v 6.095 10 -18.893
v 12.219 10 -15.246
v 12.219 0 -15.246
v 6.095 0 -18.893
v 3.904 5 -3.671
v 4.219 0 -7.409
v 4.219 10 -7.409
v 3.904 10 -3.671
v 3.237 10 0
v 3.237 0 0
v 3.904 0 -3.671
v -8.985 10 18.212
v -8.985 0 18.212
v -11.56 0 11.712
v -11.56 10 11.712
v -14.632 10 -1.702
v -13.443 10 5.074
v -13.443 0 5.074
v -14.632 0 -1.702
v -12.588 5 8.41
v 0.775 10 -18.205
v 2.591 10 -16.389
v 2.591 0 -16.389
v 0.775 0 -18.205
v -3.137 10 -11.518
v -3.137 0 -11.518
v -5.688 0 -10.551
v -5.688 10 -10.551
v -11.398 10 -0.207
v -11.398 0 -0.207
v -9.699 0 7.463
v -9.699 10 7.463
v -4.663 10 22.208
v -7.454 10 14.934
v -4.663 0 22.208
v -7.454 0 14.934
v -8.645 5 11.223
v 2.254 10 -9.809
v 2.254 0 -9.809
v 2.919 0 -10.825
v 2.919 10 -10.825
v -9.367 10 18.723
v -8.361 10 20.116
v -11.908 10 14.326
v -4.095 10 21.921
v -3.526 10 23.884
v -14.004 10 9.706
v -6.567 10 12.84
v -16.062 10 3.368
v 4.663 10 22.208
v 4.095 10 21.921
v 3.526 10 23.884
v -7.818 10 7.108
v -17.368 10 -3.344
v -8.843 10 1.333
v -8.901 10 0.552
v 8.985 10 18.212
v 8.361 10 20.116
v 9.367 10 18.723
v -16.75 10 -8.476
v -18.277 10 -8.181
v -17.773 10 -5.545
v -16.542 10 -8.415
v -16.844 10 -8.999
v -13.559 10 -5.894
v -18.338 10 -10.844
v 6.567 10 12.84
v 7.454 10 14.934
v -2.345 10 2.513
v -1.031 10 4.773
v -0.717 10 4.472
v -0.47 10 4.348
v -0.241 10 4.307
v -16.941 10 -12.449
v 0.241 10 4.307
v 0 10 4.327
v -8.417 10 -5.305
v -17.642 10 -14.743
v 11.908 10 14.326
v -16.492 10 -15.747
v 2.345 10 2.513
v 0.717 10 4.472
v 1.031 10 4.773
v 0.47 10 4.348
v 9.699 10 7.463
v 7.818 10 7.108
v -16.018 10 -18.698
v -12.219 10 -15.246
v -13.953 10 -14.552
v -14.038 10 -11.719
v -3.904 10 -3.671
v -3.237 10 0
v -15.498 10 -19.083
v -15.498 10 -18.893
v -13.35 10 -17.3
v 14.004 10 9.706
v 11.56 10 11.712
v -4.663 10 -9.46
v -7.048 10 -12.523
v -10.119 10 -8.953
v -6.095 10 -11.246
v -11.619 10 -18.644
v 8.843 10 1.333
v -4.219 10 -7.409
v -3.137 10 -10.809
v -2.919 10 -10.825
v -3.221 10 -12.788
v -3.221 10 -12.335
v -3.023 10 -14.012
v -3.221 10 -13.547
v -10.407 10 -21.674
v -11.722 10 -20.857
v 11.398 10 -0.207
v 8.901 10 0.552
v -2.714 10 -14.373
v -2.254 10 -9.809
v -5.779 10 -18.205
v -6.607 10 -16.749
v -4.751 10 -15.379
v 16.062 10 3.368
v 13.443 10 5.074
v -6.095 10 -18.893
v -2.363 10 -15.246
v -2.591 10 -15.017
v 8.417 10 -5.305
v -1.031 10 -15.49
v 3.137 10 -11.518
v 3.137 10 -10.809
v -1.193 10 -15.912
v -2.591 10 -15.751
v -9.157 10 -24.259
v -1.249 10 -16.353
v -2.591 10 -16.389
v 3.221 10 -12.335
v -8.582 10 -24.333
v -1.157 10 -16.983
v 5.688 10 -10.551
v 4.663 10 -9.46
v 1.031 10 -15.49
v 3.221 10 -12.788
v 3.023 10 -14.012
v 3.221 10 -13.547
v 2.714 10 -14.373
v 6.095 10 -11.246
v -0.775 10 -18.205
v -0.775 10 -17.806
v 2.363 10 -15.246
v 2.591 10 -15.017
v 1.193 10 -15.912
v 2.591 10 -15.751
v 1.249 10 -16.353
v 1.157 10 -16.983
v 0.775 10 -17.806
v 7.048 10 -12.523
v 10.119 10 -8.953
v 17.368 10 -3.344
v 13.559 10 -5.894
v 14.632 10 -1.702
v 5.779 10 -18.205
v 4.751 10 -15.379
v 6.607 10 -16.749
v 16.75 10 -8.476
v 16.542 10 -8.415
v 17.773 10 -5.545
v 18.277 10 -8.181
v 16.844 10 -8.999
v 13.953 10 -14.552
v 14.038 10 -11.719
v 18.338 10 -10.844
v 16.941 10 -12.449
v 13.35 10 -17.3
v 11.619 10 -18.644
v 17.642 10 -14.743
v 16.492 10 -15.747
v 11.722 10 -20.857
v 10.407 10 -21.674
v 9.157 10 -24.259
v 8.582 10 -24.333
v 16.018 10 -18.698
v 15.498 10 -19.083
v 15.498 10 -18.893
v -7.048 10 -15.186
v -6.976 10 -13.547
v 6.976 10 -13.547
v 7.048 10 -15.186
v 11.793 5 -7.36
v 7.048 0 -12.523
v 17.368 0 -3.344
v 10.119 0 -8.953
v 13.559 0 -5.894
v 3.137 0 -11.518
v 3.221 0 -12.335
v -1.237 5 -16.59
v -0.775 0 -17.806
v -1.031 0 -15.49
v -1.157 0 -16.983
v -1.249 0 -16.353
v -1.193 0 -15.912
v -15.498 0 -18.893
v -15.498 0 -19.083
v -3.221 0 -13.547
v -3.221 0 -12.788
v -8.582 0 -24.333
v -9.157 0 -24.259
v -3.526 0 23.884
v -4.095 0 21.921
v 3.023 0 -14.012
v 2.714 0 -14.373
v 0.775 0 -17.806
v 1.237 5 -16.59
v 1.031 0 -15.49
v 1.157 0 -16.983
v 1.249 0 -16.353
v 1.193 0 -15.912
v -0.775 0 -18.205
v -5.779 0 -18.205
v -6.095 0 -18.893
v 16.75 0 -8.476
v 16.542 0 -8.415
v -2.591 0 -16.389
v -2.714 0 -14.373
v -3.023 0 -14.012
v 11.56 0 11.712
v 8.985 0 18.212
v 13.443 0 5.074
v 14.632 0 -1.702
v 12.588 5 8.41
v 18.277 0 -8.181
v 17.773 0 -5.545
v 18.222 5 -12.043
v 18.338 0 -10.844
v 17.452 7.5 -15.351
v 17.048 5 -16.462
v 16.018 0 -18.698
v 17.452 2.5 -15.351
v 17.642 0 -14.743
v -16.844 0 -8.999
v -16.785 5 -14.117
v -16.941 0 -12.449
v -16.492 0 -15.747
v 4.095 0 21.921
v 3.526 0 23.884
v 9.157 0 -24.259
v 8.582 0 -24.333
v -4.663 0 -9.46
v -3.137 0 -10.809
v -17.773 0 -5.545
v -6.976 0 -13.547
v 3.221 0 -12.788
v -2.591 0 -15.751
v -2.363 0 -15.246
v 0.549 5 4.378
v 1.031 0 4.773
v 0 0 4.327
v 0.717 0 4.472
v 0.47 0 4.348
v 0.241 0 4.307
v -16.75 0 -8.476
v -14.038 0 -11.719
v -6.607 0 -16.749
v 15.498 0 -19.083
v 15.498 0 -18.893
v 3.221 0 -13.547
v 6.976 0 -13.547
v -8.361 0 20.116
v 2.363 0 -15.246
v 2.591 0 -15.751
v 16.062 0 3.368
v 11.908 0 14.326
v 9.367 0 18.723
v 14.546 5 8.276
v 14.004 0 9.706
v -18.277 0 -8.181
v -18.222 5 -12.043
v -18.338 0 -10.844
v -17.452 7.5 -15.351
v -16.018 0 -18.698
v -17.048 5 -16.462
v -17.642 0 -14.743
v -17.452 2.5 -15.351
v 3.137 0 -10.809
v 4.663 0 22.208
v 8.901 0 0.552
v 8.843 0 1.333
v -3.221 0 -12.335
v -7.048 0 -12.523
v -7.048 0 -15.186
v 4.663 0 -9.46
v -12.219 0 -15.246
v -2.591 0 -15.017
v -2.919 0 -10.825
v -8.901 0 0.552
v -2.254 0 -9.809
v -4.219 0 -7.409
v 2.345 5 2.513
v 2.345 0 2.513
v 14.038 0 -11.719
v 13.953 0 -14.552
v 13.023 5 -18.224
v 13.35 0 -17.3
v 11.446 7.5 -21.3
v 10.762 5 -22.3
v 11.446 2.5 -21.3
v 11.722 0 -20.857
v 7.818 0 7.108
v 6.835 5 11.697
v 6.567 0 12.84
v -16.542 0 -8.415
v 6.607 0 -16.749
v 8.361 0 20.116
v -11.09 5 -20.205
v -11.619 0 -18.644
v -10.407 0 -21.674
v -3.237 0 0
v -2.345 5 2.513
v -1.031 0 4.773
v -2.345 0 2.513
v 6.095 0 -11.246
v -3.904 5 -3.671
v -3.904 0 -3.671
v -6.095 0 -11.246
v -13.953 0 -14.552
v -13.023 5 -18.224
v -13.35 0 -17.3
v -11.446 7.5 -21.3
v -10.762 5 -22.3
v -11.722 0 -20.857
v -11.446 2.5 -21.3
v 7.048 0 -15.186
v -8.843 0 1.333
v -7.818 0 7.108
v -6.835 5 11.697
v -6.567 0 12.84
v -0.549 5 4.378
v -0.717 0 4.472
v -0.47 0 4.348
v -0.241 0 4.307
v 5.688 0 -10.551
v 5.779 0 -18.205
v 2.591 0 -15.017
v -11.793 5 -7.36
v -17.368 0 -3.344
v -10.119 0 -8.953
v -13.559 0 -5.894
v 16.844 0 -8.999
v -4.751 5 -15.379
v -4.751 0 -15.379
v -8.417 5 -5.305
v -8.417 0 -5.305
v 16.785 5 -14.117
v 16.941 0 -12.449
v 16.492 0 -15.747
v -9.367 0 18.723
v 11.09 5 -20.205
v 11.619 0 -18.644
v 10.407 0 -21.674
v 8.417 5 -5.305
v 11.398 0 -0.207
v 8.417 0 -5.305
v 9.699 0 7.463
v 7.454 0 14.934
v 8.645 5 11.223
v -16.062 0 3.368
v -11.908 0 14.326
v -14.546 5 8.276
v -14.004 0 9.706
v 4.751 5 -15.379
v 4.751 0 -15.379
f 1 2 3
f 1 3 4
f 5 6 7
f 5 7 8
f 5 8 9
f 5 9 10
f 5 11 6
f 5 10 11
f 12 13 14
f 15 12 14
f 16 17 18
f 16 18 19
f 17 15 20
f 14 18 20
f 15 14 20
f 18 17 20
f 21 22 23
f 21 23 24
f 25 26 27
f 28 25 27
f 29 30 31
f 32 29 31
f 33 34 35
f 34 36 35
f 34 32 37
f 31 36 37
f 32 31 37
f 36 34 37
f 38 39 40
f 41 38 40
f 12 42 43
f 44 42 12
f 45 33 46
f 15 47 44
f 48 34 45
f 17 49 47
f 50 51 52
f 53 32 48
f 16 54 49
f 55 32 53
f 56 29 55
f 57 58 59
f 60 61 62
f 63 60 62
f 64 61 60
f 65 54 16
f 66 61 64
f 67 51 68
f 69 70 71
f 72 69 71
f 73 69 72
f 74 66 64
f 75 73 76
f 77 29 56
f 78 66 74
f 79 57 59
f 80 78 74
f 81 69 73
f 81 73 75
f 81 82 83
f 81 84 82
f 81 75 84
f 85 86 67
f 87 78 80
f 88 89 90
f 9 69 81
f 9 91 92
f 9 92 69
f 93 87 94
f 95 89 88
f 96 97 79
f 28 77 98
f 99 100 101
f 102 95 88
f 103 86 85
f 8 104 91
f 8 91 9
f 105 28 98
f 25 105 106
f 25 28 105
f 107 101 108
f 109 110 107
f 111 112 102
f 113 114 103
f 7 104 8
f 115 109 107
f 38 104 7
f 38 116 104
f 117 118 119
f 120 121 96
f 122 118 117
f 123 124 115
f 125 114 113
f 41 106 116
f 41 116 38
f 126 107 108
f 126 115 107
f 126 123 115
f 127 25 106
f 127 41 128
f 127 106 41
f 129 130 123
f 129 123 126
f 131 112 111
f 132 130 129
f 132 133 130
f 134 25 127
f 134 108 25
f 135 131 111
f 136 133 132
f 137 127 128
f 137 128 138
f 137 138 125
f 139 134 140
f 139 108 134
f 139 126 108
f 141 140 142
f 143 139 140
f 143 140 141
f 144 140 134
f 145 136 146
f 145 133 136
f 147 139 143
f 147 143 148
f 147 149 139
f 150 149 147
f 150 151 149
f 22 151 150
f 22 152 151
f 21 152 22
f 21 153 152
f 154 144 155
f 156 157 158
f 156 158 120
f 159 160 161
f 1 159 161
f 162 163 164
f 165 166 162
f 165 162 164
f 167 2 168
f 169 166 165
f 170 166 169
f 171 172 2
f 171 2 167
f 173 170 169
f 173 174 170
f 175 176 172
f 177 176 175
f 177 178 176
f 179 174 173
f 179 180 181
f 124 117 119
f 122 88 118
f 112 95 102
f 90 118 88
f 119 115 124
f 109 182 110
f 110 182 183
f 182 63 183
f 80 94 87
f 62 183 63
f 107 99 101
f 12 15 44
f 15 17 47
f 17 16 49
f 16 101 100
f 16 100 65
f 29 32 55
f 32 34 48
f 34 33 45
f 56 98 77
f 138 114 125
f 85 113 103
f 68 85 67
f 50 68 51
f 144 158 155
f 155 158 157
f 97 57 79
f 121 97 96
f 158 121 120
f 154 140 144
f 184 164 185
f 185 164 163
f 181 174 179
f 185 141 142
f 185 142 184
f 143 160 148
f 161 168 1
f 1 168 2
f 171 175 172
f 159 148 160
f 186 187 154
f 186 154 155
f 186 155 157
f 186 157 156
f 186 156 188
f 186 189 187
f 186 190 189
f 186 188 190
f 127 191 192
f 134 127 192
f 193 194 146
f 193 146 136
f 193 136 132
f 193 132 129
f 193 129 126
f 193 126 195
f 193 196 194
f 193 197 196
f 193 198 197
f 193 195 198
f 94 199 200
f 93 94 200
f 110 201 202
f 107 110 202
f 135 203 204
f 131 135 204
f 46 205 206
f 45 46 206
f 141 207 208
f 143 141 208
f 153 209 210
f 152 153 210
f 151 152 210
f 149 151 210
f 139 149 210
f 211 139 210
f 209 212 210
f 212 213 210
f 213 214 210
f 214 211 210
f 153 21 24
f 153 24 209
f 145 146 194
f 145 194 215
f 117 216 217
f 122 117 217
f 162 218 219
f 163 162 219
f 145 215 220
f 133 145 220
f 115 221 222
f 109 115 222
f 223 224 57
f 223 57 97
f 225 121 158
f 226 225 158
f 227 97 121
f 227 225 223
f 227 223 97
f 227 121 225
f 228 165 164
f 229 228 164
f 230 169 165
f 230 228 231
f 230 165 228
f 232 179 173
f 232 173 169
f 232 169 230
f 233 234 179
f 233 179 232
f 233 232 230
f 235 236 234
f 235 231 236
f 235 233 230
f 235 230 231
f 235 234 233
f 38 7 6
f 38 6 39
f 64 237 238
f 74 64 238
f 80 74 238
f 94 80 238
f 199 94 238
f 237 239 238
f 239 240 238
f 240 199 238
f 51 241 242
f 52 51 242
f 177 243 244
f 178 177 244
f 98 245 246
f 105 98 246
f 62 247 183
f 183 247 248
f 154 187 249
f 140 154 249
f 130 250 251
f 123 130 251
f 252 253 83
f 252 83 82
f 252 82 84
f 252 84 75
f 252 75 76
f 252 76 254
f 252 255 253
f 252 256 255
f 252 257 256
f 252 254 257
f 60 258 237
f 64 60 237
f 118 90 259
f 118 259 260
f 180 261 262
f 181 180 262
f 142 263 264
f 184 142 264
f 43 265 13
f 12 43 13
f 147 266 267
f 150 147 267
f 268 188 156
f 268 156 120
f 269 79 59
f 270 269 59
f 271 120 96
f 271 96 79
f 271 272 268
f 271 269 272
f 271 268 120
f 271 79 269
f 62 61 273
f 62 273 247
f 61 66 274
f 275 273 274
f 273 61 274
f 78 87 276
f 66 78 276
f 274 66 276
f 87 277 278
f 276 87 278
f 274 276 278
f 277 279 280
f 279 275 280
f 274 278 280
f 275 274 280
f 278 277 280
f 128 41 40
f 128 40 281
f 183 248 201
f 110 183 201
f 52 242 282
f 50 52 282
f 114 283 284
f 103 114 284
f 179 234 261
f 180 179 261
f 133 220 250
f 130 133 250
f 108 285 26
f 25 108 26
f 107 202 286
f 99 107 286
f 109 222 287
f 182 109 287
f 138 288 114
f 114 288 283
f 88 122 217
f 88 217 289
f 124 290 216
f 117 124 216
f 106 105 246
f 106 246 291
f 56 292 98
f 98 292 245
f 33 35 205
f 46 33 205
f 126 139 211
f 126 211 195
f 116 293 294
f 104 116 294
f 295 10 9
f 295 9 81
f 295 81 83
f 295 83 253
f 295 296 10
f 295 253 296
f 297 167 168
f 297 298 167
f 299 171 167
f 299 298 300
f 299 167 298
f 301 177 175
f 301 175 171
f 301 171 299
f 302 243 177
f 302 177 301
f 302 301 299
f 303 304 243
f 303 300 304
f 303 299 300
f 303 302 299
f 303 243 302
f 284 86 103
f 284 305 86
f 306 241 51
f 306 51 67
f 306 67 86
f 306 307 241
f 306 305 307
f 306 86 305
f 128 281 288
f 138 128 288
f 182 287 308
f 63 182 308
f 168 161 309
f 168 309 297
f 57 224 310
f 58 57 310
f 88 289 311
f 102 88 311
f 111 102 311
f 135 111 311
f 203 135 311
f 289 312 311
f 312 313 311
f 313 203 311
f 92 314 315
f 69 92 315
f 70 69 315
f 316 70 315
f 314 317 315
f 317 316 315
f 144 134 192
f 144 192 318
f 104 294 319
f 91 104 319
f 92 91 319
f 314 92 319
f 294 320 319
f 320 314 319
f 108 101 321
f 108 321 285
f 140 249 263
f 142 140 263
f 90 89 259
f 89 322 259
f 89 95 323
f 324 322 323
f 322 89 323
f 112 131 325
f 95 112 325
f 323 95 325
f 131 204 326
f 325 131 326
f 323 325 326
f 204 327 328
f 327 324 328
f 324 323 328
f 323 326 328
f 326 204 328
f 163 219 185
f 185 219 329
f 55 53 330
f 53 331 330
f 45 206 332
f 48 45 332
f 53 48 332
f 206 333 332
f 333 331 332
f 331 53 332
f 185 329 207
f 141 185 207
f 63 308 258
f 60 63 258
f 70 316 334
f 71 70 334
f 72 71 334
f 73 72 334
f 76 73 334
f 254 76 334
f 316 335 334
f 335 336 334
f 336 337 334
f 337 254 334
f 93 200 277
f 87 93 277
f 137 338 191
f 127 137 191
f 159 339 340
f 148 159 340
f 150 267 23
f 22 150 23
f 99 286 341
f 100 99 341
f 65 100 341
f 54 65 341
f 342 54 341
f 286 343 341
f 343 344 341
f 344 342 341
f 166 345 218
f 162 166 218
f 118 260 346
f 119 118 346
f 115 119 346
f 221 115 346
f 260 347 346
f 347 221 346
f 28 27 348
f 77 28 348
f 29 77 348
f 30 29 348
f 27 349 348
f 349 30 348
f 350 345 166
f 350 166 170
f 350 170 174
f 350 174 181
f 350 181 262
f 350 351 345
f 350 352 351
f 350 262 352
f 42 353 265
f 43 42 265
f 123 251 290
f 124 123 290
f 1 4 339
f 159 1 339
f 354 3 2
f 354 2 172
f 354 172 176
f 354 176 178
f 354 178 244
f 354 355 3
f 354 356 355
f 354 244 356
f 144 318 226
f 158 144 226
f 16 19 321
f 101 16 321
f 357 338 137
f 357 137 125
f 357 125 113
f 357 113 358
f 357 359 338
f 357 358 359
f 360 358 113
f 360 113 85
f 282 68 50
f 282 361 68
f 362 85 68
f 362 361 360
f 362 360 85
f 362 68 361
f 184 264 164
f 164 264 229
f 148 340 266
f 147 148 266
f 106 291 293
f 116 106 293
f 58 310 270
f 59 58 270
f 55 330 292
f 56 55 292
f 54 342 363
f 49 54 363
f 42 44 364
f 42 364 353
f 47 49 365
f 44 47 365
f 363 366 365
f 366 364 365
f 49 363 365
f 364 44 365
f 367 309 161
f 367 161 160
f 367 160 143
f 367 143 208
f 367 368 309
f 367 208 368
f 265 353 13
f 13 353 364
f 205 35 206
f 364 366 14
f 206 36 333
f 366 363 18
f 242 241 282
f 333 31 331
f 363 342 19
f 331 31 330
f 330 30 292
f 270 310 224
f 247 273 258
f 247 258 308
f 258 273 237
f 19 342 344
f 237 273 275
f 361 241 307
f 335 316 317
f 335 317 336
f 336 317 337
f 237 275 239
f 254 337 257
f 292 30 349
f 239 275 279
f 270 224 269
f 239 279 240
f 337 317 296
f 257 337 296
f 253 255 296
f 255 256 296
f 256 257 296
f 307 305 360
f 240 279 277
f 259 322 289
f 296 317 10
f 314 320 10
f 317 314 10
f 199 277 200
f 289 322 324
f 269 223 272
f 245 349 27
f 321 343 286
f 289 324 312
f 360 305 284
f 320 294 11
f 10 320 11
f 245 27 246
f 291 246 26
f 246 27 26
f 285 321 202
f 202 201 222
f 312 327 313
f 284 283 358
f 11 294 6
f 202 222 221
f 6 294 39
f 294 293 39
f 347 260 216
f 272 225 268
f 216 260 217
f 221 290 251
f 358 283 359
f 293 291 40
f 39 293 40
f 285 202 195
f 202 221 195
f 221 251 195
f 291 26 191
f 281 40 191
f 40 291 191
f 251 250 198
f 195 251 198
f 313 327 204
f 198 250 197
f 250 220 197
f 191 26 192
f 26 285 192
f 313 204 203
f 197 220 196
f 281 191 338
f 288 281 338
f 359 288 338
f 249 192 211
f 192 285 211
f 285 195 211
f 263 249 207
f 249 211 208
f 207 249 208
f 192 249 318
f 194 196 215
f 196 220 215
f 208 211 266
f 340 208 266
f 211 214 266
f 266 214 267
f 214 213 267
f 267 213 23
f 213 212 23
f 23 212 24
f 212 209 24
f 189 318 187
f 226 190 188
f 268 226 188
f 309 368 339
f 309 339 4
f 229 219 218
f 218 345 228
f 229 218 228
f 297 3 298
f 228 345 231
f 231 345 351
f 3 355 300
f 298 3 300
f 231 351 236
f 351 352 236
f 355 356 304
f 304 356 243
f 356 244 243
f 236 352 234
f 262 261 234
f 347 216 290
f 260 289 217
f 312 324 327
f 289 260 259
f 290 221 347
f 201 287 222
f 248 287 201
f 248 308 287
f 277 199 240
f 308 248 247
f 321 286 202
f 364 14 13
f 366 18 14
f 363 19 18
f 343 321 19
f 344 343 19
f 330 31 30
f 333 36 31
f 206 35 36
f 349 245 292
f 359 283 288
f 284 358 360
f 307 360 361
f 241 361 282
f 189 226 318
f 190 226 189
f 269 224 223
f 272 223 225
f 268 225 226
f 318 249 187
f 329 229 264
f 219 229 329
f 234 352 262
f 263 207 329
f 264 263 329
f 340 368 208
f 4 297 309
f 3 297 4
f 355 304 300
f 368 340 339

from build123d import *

# Parameters (mm, degrees)
BOSS_EXTRUDE1_DEPTH = 10


with BuildPart() as part:
    # Sketch1 → Boss-Extrude1 (new body)
    with BuildSketch(Plane(origin=(0, 0, 0), x_dir=(1, 0, 0), z_dir=(0, 1, 0))):
        with BuildLine():
            Line((-0.77475919, 17.805575817), (-0.77475919, 18.205472922))
            Line((-0.77475919, 18.205472922), (-2.591328104, 16.388904008))
            Line((-2.591328104, 16.388904008), (-2.591328104, 15.751300349))
            Line((-2.591328104, 15.751300349), (-2.362753208, 15.246029526))
            Line((-2.362753208, 15.246029526), (-2.591328104, 15.017454629))
            Line((-2.591328104, 15.017454629), (-5.779346397, 18.205472922))
            Line((-5.779346397, 18.205472922), (-6.095268046, 18.892889731))
            Line((-6.095268046, 18.892889731), (-12.218826377, 15.246029526))
            add(Edge.make_bspline(
                [(-12.218826377, 15.246029526), (-11.778721685, 20.620695324), (-8.581947184, 24.333309757)],
                knots=[0, 0, 0, 1, 1, 1], degree=2))
            Line((-8.581947184, 24.333309757), (-9.157047212, 24.259356466))
            add(Edge.make_bspline(
                [(-9.157047212, 24.259356466), (-14.447655818, 18.459017457), (-14.037673367, 11.71891231)],
                knots=[0, 0, 0, 1, 1, 1], degree=2))
            Line((-14.037673367, 11.71891231), (-6.606809824, 16.748676517))
            add(Edge.make_bspline(
                [(-6.606809824, 16.748676517), (-4.84160761, 15.196820639), (-2.713996128, 14.373140945)],
                knots=[0, 0, 0, 1, 1, 1], degree=2))
            Line((-2.713996128, 14.373140945), (-3.022885214, 14.011805458))
            Line((-3.022885214, 14.011805458), (-7.04843704, 15.185986651))
            Line((-7.04843704, 15.185986651), (-16.542260828, 8.414995079))
            Line((-16.542260828, 8.414995079), (-16.750184267, 8.475642613))
            Line((-16.750184267, 8.475642613), (-16.844000716, 8.999446115))
            add(Edge.make_bspline(
                [(-16.844000716, 8.999446115), (-17.398318859, 14.288056659), (-15.498292646, 18.892889731)],
                knots=[0, 0, 0, 0.937492037, 0.937492037, 0.937492037], degree=2))
            Line((-15.498292646, 18.892889731), (-15.498292646, 19.083480243))
            Line((-15.498292646, 19.083480243), (-16.018185643, 18.698181665))
            add(Edge.make_bspline(
                [(-16.018185643, 18.698181665), (-19.54860855, 11.964227915), (-17.772645014, 5.545401207)],
                knots=[0, 0, 0, 1, 1, 1], degree=2))
            Line((-17.772645014, 5.545401207), (-6.976425445, 13.546601594))
            Line((-6.976425445, 13.546601594), (-3.220749094, 13.546601594))
            Line((-3.220749094, 13.546601594), (-3.220749094, 12.787927187))
            Line((-3.220749094, 12.787927187), (-7.04843704, 12.523140875))
            add(Edge.make_bspline(
                [(-7.04843704, 12.523140875), (-11.378277138, 6.786058759), (-17.368277161, 3.344273399)],
                knots=[0, 0, 0, 1, 1, 1], degree=2))
            add(Edge.make_bspline(
                [(-17.368277161, 3.344273399), (-15.724066268, -8.863327627), (-9.366664211, -18.723496609)],
                knots=[0, 0, 0, 0.983877667, 0.983877667, 0.983877667], degree=2))
            Line((-9.366664211, -18.723496609), (-8.360846592, -20.115700618))
            Line((-8.360846592, -20.115700618), (-8.984631154, -18.211516166))
            add(Edge.make_bspline(
                [(-8.984631154, -18.211516166), (-13.367422275, -8.565356306), (-14.632198794, 1.702238546)],
                knots=[0, 0, 0, 0.96561084, 0.96561084, 0.96561084], degree=2))
            Line((-14.632198794, 1.702238546), (-6.095268046, 11.245692572))
            Line((-6.095268046, 11.245692572), (-3.220749094, 12.334656835))
            Line((-3.220749094, 12.334656835), (-3.137312332, 11.517506569))
            Line((-3.137312332, 11.517506569), (-5.68828216, 10.551113575))
            add(Edge.make_bspline(
                [(-5.68828216, 10.551113575), (-8.289822739, 5.230431142), (-11.398307003, 0.207327452)],
                knots=[0, 0, 0, 0.941866113, 0.941866113, 0.941866113], degree=2))
            add(Edge.make_bspline(
                [(-11.398307003, 0.207327452), (-9.259704318, -11.446844699), (-4.663293434, -22.207552312)],
                knots=[0, 0, 0, 0.984459997, 0.984459997, 0.984459997], degree=2))
            Line((-4.663293434, -22.207552312), (-3.52644295, -23.884260193))
            Line((-3.52644295, -23.884260193), (-4.094868192, -21.920639742))
            add(Edge.make_bspline(
                [(-4.094868192, -21.920639742), (-7.201743798, -11.767427454), (-8.842724338, -1.332659634)],
                knots=[0, 0, 0, 0.95775591, 0.95775591, 0.95775591], degree=2))
            Line((-8.842724338, -1.332659634), (-8.901419383, -0.55237788))
            Line((-8.901419383, -0.55237788), (-4.663293434, 9.459890703))
            Line((-4.663293434, 9.459890703), (-3.137312332, 10.808717055))
            Line((-3.137312332, 10.808717055), (-2.918598052, 10.825169375))
            Line((-2.918598052, 10.825169375), (-2.254002061, 9.809392881))
            Line((-2.254002061, 9.809392881), (-4.219363172, 7.408826128))
            add(Edge.make_bspline(
                [(-4.219363172, 7.408826128), (-4.079064375, 3.638553555), (-3.236682616, 0)],
                knots=[0, 0, 0, 0.892205795, 0.892205795, 0.892205795], degree=2))
            add(Edge.make_bspline(
                [(-3.236682616, 0), (-2.55670829, -2.640008962), (-1.031376318, -4.773443308)],
                knots=[0, 0, 0, 0.876843131, 0.876843131, 0.876843131], degree=2))
            add(Edge.make_bspline(
                [(-1.031376318, -4.773443308), (-0.582556801, -4.206513749), (0, -4.327217184)],
                knots=[0, 0, 0, 1, 1, 1], degree=2))
            add(Edge.make_bspline(
                [(1.031376318, -4.773443308), (0.582556801, -4.206513749), (0, -4.327217184)],
                knots=[0, 0, 0, 1, 1, 1], degree=2))
            add(Edge.make_bspline(
                [(3.236682616, 0), (2.55670829, -2.640008962), (1.031376318, -4.773443308)],
                knots=[0, 0, 0, 0.876843131, 0.876843131, 0.876843131], degree=2))
            add(Edge.make_bspline(
                [(4.219363172, 7.408826128), (4.079064375, 3.638553555), (3.236682616, 0)],
                knots=[0, 0, 0, 0.892205795, 0.892205795, 0.892205795], degree=2))
            Line((4.219363172, 7.408826128), (2.254002061, 9.809392881))
            Line((2.254002061, 9.809392881), (2.918598052, 10.825169375))
            Line((2.918598052, 10.825169375), (3.137312332, 10.808717055))
            Line((3.137312332, 10.808717055), (4.663293434, 9.459890703))
            Line((4.663293434, 9.459890703), (8.901419383, -0.55237788))
            Line((8.901419383, -0.55237788), (8.842724338, -1.332659634))
            add(Edge.make_bspline(
                [(4.094868192, -21.920639742), (7.201743798, -11.767427454), (8.842724338, -1.332659634)],
                knots=[0, 0, 0, 0.95775591, 0.95775591, 0.95775591], degree=2))
            Line((4.094868192, -21.920639742), (3.52644295, -23.884260193))
            Line((3.52644295, -23.884260193), (4.663293434, -22.207552312))
            add(Edge.make_bspline(
                [(11.398307003, 0.207327452), (9.259704318, -11.446844699), (4.663293434, -22.207552312)],
                knots=[0, 0, 0, 0.984459997, 0.984459997, 0.984459997], degree=2))
            add(Edge.make_bspline(
                [(5.68828216, 10.551113575), (8.289822739, 5.230431142), (11.398307003, 0.207327452)],
                knots=[0, 0, 0, 0.941866113, 0.941866113, 0.941866113], degree=2))
            Line((5.68828216, 10.551113575), (3.137312332, 11.517506569))
            Line((3.137312332, 11.517506569), (3.220749094, 12.334656835))
            Line((3.220749094, 12.334656835), (6.095268046, 11.245692572))
            Line((6.095268046, 11.245692572), (14.632198794, 1.702238546))
            add(Edge.make_bspline(
                [(8.984631154, -18.211516166), (13.367422275, -8.565356306), (14.632198794, 1.702238546)],
                knots=[0, 0, 0, 0.96561084, 0.96561084, 0.96561084], degree=2))
            Line((8.984631154, -18.211516166), (8.360846592, -20.115700618))
            Line((8.360846592, -20.115700618), (9.366664211, -18.723496609))
            add(Edge.make_bspline(
                [(17.368277161, 3.344273399), (15.724066268, -8.863327627), (9.366664211, -18.723496609)],
                knots=[0, 0, 0, 0.983877667, 0.983877667, 0.983877667], degree=2))
            add(Edge.make_bspline(
                [(7.04843704, 12.523140875), (11.378277138, 6.786058759), (17.368277161, 3.344273399)],
                knots=[0, 0, 0, 1, 1, 1], degree=2))
            Line((7.04843704, 12.523140875), (3.220749094, 12.787927187))
            Line((3.220749094, 12.787927187), (3.220749094, 13.546601594))
            Line((3.220749094, 13.546601594), (6.976425445, 13.546601594))
            Line((6.976425445, 13.546601594), (17.772645014, 5.545401207))
            add(Edge.make_bspline(
                [(16.018185643, 18.698181665), (19.54860855, 11.964227915), (17.772645014, 5.545401207)],
                knots=[0, 0, 0, 1, 1, 1], degree=2))
            Line((16.018185643, 18.698181665), (15.498292646, 19.083480243))
            Line((15.498292646, 19.083480243), (15.498292646, 18.892889731))
            add(Edge.make_bspline(
                [(16.844000716, 8.999446115), (17.398318859, 14.288056659), (15.498292646, 18.892889731)],
                knots=[0, 0, 0, 0.937492037, 0.937492037, 0.937492037], degree=2))
            Line((16.844000716, 8.999446115), (16.750184267, 8.475642613))
            Line((16.750184267, 8.475642613), (16.542260828, 8.414995079))
            Line((16.542260828, 8.414995079), (7.04843704, 15.185986651))
            Line((7.04843704, 15.185986651), (3.022885214, 14.011805458))
            Line((3.022885214, 14.011805458), (2.713996128, 14.373140945))
            add(Edge.make_bspline(
                [(6.606809824, 16.748676517), (4.84160761, 15.196820639), (2.713996128, 14.373140945)],
                knots=[0, 0, 0, 1, 1, 1], degree=2))
            Line((6.606809824, 16.748676517), (14.037673367, 11.71891231))
            add(Edge.make_bspline(
                [(9.157047212, 24.259356466), (14.447655818, 18.459017457), (14.037673367, 11.71891231)],
                knots=[0, 0, 0, 1, 1, 1], degree=2))
            Line((9.157047212, 24.259356466), (8.581947184, 24.333309757))
            add(Edge.make_bspline(
                [(12.218826377, 15.246029526), (11.778721685, 20.620695324), (8.581947184, 24.333309757)],
                knots=[0, 0, 0, 1, 1, 1], degree=2))
            Line((12.218826377, 15.246029526), (6.095268046, 18.892889731))
            Line((6.095268046, 18.892889731), (5.779346397, 18.205472922))
            Line((5.779346397, 18.205472922), (2.591328104, 15.017454629))
            Line((2.591328104, 15.017454629), (2.362753208, 15.246029526))
            Line((2.362753208, 15.246029526), (2.591328104, 15.751300349))
            Line((2.591328104, 15.751300349), (2.591328104, 16.388904008))
            Line((2.591328104, 16.388904008), (0.77475919, 18.205472922))
            Line((0.77475919, 18.205472922), (0.77475919, 17.805575817))
            add(Edge.make_bspline(
                [(0.77475919, 17.805575817), (1.570165167, 16.532957411), (1.031376318, 15.489501362)],
                knots=[0, 0, 0, 1, 1, 1], degree=2))
            Line((1.031376318, 15.489501362), (-1.031376318, 15.489501362))
            add(Edge.make_bspline(
                [(-0.77475919, 17.805575817), (-1.570165167, 16.532957411), (-1.031376318, 15.489501362)],
                knots=[0, 0, 0, 1, 1, 1], degree=2))
        make_face()
    extrude(amount=BOSS_EXTRUDE1_DEPTH)


solid = part.part
